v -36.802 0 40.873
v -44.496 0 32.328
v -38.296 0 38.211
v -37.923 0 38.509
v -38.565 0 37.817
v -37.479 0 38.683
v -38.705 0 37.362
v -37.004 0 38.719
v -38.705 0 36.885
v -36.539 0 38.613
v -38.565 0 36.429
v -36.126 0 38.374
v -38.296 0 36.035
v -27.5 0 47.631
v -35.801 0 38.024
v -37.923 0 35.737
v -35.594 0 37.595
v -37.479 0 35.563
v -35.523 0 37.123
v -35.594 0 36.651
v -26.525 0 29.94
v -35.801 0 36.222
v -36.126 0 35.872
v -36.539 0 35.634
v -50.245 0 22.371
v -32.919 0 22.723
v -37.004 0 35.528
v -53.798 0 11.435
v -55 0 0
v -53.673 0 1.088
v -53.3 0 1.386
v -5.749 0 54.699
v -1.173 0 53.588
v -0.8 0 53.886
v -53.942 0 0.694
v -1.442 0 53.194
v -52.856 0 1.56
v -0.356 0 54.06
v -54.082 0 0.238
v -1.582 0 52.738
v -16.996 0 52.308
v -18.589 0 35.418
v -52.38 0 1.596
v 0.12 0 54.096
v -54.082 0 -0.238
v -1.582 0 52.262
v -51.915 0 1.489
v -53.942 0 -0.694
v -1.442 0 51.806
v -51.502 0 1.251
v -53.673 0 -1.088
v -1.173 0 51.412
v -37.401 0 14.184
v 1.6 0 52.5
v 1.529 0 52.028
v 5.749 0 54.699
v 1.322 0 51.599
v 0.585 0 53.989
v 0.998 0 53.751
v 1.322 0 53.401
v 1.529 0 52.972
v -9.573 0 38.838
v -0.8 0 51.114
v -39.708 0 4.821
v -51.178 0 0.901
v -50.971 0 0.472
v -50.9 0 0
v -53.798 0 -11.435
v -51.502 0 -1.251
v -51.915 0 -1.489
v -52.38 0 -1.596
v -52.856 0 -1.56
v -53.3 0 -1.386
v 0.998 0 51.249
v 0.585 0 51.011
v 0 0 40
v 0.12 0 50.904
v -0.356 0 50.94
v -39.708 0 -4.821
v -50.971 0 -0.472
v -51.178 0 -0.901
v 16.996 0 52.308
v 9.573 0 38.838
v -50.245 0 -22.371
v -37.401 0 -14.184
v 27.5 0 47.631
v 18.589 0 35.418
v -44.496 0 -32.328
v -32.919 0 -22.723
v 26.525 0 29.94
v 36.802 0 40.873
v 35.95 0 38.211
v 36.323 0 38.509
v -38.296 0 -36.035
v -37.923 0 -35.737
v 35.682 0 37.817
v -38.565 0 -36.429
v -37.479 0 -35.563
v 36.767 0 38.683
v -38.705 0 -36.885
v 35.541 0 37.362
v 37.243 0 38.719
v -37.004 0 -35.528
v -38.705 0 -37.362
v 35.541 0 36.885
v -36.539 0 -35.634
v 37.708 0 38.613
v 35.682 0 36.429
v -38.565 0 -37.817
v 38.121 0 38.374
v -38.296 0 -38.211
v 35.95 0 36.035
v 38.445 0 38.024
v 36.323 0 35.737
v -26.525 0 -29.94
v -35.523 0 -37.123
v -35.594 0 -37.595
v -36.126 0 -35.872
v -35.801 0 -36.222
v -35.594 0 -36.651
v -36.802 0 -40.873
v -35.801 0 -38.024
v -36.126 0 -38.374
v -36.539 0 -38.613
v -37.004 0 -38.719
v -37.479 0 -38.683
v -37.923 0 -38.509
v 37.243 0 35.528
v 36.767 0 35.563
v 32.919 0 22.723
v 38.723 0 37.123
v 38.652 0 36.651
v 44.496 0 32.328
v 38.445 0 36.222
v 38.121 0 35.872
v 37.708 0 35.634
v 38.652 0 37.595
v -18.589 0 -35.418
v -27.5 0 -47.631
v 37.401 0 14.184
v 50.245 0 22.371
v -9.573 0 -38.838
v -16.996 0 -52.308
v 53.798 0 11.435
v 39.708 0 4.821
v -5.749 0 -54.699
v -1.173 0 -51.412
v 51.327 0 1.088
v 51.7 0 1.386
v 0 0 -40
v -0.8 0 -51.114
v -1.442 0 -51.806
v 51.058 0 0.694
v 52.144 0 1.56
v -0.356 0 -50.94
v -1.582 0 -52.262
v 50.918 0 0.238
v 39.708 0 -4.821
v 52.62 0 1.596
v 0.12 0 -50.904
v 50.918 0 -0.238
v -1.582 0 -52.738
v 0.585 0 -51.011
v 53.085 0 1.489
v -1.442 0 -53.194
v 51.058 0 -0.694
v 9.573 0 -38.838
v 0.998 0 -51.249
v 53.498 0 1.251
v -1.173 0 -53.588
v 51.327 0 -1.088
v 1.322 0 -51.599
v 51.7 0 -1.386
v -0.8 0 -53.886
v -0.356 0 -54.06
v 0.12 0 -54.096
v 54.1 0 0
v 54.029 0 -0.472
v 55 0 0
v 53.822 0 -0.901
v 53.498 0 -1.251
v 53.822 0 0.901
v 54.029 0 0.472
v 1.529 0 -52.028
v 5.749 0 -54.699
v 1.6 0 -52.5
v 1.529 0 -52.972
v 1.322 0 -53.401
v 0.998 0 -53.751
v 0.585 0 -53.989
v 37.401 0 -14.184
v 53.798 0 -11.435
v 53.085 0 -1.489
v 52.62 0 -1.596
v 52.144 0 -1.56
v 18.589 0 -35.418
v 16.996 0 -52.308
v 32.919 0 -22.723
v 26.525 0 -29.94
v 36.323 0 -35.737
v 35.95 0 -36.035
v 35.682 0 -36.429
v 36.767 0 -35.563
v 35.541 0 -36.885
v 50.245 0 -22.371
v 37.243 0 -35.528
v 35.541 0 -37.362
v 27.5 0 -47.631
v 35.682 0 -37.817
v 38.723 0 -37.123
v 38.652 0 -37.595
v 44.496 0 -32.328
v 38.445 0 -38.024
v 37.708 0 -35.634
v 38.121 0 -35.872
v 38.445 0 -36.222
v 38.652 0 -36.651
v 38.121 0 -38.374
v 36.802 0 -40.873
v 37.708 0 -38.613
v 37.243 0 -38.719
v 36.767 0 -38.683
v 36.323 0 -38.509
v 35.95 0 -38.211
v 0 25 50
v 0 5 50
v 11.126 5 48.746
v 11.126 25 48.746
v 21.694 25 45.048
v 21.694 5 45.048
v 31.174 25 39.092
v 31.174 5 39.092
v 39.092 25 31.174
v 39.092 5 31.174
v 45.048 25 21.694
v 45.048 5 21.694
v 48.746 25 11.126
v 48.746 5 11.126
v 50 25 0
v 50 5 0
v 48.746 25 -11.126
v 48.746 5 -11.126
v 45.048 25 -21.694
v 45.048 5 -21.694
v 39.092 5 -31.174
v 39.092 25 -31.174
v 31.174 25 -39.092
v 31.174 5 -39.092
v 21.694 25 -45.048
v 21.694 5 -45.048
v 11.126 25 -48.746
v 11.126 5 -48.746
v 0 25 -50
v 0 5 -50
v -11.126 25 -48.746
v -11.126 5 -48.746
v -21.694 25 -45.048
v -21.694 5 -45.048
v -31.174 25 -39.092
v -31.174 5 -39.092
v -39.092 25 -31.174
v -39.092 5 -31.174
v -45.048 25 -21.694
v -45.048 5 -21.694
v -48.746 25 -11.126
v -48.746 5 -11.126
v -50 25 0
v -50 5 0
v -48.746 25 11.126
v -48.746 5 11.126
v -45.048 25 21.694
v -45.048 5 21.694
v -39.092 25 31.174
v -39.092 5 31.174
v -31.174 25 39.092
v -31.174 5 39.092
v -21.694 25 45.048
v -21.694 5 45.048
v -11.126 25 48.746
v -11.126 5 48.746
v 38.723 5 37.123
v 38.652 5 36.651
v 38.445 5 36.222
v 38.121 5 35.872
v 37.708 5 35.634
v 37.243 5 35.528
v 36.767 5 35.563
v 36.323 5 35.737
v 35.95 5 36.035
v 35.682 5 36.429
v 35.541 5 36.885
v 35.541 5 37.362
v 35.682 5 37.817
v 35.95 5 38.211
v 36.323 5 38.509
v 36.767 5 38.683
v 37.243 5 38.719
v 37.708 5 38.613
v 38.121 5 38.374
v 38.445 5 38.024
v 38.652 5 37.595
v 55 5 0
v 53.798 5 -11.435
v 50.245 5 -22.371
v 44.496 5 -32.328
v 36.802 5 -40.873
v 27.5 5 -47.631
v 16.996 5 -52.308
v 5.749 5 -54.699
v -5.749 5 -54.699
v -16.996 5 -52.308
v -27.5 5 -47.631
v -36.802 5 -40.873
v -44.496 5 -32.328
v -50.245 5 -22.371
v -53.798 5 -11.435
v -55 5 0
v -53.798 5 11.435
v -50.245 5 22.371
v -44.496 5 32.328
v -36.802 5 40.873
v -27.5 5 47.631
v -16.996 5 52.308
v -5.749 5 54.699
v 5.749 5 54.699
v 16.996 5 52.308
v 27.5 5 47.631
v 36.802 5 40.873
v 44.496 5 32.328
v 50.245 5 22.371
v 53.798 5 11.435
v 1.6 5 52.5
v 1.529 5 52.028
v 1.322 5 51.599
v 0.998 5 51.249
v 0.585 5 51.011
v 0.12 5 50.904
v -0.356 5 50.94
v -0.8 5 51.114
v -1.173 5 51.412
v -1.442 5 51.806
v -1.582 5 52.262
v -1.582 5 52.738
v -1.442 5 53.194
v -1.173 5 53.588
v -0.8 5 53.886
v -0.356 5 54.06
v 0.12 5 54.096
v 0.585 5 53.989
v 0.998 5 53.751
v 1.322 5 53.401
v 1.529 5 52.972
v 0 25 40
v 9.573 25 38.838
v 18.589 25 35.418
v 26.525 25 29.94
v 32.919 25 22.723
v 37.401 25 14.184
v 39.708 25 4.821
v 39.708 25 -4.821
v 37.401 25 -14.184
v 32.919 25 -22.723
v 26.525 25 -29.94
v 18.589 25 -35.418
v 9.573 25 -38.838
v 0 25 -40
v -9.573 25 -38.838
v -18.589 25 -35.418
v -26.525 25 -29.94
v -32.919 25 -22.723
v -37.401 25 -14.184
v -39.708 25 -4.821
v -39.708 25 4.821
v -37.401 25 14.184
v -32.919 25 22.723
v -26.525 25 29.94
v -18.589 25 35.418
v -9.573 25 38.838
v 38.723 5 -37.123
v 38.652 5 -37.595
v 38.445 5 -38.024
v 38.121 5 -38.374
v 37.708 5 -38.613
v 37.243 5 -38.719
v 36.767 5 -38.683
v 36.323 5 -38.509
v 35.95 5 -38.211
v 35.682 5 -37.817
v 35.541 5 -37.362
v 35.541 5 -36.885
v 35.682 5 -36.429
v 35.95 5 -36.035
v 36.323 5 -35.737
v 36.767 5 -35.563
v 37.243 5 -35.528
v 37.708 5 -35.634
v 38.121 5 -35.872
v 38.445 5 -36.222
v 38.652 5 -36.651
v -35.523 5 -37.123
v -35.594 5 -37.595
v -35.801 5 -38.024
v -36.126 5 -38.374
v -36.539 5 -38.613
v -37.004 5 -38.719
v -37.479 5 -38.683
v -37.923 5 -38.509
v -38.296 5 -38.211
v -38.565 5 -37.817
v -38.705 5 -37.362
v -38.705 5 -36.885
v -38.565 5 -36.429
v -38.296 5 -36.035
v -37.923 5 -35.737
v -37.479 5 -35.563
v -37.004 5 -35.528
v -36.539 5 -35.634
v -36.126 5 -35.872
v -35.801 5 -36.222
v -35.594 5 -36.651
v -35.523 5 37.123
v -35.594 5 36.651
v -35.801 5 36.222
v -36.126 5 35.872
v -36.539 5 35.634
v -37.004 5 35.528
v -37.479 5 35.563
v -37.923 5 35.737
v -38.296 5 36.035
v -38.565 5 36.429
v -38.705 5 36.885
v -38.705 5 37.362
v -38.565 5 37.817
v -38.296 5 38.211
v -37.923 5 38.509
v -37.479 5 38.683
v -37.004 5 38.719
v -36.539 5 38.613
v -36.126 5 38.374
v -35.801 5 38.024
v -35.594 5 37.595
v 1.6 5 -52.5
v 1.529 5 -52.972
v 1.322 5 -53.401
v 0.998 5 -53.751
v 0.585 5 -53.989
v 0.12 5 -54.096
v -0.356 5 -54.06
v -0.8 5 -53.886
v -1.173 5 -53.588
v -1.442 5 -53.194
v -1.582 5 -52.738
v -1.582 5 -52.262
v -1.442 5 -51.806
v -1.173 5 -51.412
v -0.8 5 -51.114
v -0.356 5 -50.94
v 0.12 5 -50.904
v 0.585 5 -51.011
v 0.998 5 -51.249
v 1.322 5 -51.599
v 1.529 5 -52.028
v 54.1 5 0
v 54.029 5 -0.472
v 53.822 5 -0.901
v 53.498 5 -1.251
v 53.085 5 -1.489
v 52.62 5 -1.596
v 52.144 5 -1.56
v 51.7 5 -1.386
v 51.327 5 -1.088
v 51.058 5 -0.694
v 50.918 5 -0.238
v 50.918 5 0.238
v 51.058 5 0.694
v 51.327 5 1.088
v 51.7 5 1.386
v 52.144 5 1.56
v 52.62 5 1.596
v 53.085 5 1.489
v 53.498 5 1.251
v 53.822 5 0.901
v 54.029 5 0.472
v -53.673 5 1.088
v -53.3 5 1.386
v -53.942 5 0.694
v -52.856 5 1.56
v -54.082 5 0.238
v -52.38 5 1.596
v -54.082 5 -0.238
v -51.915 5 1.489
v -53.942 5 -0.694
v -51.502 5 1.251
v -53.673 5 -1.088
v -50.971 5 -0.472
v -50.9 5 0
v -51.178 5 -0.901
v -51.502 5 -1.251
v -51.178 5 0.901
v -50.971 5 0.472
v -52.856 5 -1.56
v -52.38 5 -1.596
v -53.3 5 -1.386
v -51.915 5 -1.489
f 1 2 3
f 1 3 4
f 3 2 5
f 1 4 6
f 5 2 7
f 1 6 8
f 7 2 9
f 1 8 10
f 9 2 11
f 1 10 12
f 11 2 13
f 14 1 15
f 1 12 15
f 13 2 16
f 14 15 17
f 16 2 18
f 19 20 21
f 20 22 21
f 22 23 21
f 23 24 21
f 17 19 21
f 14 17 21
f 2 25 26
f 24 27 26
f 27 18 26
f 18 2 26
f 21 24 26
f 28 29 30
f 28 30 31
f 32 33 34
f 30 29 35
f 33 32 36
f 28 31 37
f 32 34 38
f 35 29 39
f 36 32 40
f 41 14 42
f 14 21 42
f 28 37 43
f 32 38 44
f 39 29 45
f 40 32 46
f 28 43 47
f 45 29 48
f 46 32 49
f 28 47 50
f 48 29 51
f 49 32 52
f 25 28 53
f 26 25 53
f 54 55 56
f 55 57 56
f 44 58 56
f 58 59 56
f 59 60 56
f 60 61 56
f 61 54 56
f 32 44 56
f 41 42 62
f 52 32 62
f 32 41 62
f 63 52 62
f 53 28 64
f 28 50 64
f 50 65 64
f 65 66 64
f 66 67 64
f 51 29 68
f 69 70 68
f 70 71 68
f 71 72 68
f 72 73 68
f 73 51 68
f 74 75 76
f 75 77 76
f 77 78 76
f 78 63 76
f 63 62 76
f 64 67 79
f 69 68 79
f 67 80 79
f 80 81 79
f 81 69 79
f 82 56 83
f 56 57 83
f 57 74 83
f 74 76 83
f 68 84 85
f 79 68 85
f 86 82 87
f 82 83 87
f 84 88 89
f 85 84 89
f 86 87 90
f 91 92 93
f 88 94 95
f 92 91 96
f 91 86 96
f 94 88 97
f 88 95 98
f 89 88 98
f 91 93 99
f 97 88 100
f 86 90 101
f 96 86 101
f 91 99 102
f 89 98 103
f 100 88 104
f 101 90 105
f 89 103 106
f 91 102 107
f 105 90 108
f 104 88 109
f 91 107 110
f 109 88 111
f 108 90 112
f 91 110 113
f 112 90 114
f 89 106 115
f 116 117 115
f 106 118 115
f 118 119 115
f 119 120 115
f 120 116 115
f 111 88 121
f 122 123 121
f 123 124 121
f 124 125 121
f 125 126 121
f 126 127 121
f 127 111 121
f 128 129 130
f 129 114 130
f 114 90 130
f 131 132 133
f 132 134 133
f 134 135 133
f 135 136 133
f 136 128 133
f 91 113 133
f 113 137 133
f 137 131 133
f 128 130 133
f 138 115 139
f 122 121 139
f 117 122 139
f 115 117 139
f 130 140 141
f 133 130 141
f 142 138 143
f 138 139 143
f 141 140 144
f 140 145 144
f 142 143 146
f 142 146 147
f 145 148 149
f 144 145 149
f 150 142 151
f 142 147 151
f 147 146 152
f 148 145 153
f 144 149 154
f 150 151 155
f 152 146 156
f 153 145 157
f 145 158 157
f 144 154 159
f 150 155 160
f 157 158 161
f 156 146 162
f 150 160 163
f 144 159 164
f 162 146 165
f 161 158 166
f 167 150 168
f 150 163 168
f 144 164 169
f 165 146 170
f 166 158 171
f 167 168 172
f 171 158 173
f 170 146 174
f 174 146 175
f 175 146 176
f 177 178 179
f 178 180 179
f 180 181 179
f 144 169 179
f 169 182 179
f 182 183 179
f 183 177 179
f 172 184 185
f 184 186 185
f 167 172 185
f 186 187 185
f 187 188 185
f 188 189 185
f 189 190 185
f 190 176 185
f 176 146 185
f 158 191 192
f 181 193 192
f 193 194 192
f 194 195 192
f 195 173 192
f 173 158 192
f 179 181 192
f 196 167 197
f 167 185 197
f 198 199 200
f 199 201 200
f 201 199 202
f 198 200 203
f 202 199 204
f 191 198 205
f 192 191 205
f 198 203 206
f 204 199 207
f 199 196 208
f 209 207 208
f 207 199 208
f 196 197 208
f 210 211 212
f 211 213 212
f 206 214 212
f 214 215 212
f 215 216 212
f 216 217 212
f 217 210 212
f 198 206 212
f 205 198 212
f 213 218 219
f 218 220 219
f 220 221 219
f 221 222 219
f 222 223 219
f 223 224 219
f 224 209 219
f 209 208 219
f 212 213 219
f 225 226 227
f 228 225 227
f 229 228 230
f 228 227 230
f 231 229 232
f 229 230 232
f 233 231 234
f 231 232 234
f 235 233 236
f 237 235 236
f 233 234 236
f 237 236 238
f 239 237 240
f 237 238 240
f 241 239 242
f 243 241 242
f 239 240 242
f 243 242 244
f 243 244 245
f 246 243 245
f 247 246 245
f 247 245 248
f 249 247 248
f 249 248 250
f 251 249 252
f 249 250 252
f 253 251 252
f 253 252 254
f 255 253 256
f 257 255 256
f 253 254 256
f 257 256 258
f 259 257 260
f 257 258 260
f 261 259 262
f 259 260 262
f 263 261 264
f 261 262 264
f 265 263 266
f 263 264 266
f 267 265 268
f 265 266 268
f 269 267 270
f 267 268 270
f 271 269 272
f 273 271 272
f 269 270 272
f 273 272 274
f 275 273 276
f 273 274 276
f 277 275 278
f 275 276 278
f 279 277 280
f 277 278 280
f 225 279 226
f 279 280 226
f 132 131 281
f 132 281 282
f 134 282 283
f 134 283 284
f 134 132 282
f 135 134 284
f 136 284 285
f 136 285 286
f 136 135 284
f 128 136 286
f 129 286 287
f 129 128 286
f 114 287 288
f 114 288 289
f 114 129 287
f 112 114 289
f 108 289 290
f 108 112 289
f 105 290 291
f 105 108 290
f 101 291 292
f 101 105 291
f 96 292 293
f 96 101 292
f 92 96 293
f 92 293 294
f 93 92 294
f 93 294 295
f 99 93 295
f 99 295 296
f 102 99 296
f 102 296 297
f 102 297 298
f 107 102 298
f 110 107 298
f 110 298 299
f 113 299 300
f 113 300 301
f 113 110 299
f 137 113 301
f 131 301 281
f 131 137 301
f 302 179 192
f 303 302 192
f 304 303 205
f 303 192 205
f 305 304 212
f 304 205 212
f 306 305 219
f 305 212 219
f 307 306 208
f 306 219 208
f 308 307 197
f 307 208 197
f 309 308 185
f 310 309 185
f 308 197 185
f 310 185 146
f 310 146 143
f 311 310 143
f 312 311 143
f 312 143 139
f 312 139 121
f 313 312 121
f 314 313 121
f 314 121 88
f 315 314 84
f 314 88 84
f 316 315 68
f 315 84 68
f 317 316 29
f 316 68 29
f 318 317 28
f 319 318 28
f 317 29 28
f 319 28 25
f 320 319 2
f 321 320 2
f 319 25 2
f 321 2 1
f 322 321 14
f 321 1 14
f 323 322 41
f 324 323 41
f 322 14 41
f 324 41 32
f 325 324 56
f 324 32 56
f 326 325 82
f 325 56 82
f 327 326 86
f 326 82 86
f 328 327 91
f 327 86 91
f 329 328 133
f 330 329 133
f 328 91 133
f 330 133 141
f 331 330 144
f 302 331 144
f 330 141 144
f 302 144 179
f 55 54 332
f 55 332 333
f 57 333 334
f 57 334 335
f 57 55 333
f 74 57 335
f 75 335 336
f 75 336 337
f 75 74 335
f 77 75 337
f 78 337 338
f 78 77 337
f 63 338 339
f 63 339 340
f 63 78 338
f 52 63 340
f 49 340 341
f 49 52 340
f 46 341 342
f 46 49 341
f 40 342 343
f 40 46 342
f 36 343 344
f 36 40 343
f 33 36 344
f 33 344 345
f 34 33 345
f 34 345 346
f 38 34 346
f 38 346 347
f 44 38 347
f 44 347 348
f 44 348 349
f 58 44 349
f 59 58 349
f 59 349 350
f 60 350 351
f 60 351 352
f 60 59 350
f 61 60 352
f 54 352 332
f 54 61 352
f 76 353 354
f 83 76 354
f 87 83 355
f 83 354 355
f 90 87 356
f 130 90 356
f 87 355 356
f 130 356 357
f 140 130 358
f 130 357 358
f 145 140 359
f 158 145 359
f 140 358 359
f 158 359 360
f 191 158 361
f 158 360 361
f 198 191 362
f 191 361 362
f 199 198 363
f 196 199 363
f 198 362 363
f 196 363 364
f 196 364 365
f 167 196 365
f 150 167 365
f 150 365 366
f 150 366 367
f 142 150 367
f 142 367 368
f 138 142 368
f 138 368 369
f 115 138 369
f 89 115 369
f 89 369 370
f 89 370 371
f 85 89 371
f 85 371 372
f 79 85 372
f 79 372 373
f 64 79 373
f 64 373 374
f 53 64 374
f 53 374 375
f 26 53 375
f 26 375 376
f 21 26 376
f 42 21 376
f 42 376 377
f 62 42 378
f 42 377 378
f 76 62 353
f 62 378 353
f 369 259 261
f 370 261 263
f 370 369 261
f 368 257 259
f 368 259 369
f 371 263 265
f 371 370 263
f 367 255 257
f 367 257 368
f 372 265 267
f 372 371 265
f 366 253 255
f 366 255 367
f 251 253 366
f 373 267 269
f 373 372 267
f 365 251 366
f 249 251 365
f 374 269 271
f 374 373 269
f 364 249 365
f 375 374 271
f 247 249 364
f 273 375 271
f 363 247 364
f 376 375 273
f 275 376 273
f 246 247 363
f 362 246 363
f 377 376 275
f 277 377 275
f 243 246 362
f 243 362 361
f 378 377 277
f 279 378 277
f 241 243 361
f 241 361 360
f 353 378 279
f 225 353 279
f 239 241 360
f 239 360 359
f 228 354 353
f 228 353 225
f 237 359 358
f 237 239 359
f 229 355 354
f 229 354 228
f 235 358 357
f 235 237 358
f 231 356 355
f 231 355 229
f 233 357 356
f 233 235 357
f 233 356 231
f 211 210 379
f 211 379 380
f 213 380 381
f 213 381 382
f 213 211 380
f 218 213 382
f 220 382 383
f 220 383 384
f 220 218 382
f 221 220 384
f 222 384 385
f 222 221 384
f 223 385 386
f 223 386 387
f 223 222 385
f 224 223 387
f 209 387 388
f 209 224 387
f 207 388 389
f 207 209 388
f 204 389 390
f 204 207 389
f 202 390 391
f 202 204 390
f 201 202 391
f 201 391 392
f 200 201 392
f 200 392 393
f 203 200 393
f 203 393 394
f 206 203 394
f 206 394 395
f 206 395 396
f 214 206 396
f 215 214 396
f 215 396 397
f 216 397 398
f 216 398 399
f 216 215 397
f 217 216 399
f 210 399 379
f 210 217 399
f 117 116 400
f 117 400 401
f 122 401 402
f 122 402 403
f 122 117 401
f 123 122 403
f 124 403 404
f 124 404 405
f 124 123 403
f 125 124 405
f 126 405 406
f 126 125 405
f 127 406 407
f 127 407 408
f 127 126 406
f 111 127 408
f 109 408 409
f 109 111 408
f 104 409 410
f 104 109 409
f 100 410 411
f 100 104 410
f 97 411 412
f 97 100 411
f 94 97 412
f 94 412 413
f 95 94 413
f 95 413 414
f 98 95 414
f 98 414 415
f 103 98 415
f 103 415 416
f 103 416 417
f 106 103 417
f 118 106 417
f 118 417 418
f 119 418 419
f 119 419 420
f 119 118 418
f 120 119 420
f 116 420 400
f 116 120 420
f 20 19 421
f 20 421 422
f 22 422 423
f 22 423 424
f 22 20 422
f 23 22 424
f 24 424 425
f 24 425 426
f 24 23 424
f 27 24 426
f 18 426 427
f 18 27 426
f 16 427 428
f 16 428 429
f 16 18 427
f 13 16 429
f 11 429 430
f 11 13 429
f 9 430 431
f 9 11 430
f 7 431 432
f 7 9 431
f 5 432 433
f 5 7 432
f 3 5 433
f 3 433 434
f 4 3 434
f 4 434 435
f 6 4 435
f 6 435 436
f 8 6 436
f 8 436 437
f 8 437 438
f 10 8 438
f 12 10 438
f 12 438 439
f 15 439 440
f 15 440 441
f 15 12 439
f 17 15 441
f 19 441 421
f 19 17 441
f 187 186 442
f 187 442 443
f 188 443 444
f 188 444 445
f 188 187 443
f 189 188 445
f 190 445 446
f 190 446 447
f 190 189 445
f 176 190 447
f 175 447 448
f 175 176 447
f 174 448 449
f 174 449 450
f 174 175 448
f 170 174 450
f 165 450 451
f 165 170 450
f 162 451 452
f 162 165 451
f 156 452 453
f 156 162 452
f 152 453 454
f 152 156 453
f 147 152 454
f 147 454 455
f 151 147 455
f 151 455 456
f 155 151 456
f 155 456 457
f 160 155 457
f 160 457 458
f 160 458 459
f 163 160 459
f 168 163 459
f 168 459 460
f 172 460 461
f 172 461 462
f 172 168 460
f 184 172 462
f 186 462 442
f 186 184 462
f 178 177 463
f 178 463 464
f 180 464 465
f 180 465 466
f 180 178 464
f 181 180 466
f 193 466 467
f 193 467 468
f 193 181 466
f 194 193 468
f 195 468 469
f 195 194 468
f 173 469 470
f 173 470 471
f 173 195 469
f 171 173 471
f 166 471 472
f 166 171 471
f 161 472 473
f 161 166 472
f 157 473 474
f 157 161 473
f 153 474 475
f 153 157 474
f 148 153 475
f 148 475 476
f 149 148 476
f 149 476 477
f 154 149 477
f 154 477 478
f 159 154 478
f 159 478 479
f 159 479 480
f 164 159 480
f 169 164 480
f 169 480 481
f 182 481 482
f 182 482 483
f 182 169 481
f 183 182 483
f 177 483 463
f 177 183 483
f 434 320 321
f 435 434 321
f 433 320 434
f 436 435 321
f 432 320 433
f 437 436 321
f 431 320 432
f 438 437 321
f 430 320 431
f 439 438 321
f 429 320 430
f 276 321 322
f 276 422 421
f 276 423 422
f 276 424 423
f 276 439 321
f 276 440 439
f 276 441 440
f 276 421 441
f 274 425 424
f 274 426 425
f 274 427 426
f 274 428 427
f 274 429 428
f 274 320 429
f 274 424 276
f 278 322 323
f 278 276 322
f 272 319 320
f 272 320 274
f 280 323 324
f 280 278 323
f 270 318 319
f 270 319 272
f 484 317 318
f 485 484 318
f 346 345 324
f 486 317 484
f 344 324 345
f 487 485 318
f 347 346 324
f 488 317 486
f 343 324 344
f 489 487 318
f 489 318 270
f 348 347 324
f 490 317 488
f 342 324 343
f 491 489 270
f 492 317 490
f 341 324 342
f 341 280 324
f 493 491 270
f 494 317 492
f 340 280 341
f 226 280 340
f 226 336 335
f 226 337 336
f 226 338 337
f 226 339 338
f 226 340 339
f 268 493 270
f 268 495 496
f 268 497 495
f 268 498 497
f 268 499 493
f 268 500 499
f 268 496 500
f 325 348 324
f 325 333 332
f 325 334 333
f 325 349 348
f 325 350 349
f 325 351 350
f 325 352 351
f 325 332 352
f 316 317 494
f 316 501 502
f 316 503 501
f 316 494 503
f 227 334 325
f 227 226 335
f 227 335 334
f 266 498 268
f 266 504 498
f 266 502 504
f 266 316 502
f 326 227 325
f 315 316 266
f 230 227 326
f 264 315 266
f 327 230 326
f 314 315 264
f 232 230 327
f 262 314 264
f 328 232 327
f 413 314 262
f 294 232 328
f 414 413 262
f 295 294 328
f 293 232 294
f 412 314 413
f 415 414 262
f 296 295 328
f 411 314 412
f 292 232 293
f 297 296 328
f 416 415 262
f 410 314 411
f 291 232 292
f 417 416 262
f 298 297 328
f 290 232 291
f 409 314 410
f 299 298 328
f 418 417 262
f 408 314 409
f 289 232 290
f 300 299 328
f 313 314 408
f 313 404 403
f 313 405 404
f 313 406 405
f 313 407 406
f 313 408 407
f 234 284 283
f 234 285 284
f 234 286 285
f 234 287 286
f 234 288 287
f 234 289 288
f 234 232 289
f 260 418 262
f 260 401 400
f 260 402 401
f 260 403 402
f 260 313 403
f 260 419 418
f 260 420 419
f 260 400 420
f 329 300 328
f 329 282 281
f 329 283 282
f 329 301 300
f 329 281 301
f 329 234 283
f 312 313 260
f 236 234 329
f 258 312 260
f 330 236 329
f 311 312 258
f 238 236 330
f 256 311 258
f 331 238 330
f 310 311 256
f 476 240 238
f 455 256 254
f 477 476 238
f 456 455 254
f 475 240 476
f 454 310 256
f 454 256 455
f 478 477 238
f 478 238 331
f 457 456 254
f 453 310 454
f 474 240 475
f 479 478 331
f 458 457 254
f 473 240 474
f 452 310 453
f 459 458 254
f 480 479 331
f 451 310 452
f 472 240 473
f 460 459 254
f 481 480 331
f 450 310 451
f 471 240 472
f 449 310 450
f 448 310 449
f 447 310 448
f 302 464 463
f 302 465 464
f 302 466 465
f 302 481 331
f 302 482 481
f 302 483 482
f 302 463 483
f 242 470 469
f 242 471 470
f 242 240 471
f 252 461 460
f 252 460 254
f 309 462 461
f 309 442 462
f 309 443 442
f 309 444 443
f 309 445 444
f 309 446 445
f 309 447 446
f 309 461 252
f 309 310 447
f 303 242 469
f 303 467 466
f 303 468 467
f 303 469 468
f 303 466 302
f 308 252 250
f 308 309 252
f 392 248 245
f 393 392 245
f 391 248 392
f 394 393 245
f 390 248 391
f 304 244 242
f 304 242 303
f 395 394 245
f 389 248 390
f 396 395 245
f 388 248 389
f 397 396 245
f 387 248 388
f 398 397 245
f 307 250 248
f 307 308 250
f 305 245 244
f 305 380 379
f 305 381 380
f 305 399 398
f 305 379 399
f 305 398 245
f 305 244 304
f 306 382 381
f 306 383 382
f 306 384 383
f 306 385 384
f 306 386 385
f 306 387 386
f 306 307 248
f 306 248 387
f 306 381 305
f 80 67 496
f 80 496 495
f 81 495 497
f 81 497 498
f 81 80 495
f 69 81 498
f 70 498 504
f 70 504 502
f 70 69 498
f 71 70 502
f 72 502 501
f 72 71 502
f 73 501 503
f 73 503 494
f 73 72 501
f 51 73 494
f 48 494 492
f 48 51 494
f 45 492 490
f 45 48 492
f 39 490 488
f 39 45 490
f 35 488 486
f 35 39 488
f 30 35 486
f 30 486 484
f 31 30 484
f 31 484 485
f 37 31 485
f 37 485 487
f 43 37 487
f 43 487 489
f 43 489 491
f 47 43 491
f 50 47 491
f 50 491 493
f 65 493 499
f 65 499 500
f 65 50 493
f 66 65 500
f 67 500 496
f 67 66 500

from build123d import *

# Parameters (mm, degrees)
BOSS_EXTRUDE1_OUTLINE_R   = 55
BOSS_EXTRUDE1_OUTLINE_R_2 = 1.6
BOSS_EXTRUDE1_DEPTH       = 5
SKETCH2_R                 = 50
BOSS_EXTRUDE2_DEPTH       = 20
SKETCH3_R                 = 40
CUT_EXTRUDE1_DEPTH        = 82.700673192


# Read off the part's stored shape, not the designer's step: Boss-Extrude1
with BuildPart() as part:
    # Boss-Extrude1 outline → Boss-Extrude1 (new body)
    with BuildSketch(Plane(origin=(0, 0, 0), x_dir=(1, 0, 0), z_dir=(0, 1, 0))):
        Circle(BOSS_EXTRUDE1_OUTLINE_R)
        with Locations((-37.123106012, -37.123106012)):
            Circle(BOSS_EXTRUDE1_OUTLINE_R_2, mode=Mode.SUBTRACT)
        with Locations((0, -52.5)):
            Circle(BOSS_EXTRUDE1_OUTLINE_R_2, mode=Mode.SUBTRACT)
        with Locations((37.123106012, -37.123106012)):
            Circle(BOSS_EXTRUDE1_OUTLINE_R_2, mode=Mode.SUBTRACT)
        with Locations((-52.5, 0)):
            Circle(BOSS_EXTRUDE1_OUTLINE_R_2, mode=Mode.SUBTRACT)
        with Locations((-37.123106012, 37.123106012)):
            Circle(BOSS_EXTRUDE1_OUTLINE_R_2, mode=Mode.SUBTRACT)
        with Locations((52.5, 0)):
            Circle(BOSS_EXTRUDE1_OUTLINE_R_2, mode=Mode.SUBTRACT)
        with Locations((0, 52.5)):
            Circle(BOSS_EXTRUDE1_OUTLINE_R_2, mode=Mode.SUBTRACT)
        with Locations((37.123106012, 37.123106012)):
            Circle(BOSS_EXTRUDE1_OUTLINE_R_2, mode=Mode.SUBTRACT)
    extrude(amount=BOSS_EXTRUDE1_DEPTH)

    # Sketch2 → Boss-Extrude2 (add)
    with BuildSketch(Plane(origin=(0, 5, 0), x_dir=(1, 0, 0), z_dir=(0, 1, 0))):
        with Locations(Location((0, 0, 0), (0, 0, 270))):
            Circle(SKETCH2_R)
    extrude(amount=BOSS_EXTRUDE2_DEPTH)

    # Sketch3 → Cut-Extrude1 (cut, through all)
    with BuildSketch(Plane(origin=(0, 25, 0), x_dir=(1, 0, 0), z_dir=(0, 1, 0))):
        with Locations(Location((0, 0, 0), (0, 0, 270))):
            Circle(SKETCH3_R)
    extrude(amount=-CUT_EXTRUDE1_DEPTH, mode=Mode.SUBTRACT)


solid = part.part
